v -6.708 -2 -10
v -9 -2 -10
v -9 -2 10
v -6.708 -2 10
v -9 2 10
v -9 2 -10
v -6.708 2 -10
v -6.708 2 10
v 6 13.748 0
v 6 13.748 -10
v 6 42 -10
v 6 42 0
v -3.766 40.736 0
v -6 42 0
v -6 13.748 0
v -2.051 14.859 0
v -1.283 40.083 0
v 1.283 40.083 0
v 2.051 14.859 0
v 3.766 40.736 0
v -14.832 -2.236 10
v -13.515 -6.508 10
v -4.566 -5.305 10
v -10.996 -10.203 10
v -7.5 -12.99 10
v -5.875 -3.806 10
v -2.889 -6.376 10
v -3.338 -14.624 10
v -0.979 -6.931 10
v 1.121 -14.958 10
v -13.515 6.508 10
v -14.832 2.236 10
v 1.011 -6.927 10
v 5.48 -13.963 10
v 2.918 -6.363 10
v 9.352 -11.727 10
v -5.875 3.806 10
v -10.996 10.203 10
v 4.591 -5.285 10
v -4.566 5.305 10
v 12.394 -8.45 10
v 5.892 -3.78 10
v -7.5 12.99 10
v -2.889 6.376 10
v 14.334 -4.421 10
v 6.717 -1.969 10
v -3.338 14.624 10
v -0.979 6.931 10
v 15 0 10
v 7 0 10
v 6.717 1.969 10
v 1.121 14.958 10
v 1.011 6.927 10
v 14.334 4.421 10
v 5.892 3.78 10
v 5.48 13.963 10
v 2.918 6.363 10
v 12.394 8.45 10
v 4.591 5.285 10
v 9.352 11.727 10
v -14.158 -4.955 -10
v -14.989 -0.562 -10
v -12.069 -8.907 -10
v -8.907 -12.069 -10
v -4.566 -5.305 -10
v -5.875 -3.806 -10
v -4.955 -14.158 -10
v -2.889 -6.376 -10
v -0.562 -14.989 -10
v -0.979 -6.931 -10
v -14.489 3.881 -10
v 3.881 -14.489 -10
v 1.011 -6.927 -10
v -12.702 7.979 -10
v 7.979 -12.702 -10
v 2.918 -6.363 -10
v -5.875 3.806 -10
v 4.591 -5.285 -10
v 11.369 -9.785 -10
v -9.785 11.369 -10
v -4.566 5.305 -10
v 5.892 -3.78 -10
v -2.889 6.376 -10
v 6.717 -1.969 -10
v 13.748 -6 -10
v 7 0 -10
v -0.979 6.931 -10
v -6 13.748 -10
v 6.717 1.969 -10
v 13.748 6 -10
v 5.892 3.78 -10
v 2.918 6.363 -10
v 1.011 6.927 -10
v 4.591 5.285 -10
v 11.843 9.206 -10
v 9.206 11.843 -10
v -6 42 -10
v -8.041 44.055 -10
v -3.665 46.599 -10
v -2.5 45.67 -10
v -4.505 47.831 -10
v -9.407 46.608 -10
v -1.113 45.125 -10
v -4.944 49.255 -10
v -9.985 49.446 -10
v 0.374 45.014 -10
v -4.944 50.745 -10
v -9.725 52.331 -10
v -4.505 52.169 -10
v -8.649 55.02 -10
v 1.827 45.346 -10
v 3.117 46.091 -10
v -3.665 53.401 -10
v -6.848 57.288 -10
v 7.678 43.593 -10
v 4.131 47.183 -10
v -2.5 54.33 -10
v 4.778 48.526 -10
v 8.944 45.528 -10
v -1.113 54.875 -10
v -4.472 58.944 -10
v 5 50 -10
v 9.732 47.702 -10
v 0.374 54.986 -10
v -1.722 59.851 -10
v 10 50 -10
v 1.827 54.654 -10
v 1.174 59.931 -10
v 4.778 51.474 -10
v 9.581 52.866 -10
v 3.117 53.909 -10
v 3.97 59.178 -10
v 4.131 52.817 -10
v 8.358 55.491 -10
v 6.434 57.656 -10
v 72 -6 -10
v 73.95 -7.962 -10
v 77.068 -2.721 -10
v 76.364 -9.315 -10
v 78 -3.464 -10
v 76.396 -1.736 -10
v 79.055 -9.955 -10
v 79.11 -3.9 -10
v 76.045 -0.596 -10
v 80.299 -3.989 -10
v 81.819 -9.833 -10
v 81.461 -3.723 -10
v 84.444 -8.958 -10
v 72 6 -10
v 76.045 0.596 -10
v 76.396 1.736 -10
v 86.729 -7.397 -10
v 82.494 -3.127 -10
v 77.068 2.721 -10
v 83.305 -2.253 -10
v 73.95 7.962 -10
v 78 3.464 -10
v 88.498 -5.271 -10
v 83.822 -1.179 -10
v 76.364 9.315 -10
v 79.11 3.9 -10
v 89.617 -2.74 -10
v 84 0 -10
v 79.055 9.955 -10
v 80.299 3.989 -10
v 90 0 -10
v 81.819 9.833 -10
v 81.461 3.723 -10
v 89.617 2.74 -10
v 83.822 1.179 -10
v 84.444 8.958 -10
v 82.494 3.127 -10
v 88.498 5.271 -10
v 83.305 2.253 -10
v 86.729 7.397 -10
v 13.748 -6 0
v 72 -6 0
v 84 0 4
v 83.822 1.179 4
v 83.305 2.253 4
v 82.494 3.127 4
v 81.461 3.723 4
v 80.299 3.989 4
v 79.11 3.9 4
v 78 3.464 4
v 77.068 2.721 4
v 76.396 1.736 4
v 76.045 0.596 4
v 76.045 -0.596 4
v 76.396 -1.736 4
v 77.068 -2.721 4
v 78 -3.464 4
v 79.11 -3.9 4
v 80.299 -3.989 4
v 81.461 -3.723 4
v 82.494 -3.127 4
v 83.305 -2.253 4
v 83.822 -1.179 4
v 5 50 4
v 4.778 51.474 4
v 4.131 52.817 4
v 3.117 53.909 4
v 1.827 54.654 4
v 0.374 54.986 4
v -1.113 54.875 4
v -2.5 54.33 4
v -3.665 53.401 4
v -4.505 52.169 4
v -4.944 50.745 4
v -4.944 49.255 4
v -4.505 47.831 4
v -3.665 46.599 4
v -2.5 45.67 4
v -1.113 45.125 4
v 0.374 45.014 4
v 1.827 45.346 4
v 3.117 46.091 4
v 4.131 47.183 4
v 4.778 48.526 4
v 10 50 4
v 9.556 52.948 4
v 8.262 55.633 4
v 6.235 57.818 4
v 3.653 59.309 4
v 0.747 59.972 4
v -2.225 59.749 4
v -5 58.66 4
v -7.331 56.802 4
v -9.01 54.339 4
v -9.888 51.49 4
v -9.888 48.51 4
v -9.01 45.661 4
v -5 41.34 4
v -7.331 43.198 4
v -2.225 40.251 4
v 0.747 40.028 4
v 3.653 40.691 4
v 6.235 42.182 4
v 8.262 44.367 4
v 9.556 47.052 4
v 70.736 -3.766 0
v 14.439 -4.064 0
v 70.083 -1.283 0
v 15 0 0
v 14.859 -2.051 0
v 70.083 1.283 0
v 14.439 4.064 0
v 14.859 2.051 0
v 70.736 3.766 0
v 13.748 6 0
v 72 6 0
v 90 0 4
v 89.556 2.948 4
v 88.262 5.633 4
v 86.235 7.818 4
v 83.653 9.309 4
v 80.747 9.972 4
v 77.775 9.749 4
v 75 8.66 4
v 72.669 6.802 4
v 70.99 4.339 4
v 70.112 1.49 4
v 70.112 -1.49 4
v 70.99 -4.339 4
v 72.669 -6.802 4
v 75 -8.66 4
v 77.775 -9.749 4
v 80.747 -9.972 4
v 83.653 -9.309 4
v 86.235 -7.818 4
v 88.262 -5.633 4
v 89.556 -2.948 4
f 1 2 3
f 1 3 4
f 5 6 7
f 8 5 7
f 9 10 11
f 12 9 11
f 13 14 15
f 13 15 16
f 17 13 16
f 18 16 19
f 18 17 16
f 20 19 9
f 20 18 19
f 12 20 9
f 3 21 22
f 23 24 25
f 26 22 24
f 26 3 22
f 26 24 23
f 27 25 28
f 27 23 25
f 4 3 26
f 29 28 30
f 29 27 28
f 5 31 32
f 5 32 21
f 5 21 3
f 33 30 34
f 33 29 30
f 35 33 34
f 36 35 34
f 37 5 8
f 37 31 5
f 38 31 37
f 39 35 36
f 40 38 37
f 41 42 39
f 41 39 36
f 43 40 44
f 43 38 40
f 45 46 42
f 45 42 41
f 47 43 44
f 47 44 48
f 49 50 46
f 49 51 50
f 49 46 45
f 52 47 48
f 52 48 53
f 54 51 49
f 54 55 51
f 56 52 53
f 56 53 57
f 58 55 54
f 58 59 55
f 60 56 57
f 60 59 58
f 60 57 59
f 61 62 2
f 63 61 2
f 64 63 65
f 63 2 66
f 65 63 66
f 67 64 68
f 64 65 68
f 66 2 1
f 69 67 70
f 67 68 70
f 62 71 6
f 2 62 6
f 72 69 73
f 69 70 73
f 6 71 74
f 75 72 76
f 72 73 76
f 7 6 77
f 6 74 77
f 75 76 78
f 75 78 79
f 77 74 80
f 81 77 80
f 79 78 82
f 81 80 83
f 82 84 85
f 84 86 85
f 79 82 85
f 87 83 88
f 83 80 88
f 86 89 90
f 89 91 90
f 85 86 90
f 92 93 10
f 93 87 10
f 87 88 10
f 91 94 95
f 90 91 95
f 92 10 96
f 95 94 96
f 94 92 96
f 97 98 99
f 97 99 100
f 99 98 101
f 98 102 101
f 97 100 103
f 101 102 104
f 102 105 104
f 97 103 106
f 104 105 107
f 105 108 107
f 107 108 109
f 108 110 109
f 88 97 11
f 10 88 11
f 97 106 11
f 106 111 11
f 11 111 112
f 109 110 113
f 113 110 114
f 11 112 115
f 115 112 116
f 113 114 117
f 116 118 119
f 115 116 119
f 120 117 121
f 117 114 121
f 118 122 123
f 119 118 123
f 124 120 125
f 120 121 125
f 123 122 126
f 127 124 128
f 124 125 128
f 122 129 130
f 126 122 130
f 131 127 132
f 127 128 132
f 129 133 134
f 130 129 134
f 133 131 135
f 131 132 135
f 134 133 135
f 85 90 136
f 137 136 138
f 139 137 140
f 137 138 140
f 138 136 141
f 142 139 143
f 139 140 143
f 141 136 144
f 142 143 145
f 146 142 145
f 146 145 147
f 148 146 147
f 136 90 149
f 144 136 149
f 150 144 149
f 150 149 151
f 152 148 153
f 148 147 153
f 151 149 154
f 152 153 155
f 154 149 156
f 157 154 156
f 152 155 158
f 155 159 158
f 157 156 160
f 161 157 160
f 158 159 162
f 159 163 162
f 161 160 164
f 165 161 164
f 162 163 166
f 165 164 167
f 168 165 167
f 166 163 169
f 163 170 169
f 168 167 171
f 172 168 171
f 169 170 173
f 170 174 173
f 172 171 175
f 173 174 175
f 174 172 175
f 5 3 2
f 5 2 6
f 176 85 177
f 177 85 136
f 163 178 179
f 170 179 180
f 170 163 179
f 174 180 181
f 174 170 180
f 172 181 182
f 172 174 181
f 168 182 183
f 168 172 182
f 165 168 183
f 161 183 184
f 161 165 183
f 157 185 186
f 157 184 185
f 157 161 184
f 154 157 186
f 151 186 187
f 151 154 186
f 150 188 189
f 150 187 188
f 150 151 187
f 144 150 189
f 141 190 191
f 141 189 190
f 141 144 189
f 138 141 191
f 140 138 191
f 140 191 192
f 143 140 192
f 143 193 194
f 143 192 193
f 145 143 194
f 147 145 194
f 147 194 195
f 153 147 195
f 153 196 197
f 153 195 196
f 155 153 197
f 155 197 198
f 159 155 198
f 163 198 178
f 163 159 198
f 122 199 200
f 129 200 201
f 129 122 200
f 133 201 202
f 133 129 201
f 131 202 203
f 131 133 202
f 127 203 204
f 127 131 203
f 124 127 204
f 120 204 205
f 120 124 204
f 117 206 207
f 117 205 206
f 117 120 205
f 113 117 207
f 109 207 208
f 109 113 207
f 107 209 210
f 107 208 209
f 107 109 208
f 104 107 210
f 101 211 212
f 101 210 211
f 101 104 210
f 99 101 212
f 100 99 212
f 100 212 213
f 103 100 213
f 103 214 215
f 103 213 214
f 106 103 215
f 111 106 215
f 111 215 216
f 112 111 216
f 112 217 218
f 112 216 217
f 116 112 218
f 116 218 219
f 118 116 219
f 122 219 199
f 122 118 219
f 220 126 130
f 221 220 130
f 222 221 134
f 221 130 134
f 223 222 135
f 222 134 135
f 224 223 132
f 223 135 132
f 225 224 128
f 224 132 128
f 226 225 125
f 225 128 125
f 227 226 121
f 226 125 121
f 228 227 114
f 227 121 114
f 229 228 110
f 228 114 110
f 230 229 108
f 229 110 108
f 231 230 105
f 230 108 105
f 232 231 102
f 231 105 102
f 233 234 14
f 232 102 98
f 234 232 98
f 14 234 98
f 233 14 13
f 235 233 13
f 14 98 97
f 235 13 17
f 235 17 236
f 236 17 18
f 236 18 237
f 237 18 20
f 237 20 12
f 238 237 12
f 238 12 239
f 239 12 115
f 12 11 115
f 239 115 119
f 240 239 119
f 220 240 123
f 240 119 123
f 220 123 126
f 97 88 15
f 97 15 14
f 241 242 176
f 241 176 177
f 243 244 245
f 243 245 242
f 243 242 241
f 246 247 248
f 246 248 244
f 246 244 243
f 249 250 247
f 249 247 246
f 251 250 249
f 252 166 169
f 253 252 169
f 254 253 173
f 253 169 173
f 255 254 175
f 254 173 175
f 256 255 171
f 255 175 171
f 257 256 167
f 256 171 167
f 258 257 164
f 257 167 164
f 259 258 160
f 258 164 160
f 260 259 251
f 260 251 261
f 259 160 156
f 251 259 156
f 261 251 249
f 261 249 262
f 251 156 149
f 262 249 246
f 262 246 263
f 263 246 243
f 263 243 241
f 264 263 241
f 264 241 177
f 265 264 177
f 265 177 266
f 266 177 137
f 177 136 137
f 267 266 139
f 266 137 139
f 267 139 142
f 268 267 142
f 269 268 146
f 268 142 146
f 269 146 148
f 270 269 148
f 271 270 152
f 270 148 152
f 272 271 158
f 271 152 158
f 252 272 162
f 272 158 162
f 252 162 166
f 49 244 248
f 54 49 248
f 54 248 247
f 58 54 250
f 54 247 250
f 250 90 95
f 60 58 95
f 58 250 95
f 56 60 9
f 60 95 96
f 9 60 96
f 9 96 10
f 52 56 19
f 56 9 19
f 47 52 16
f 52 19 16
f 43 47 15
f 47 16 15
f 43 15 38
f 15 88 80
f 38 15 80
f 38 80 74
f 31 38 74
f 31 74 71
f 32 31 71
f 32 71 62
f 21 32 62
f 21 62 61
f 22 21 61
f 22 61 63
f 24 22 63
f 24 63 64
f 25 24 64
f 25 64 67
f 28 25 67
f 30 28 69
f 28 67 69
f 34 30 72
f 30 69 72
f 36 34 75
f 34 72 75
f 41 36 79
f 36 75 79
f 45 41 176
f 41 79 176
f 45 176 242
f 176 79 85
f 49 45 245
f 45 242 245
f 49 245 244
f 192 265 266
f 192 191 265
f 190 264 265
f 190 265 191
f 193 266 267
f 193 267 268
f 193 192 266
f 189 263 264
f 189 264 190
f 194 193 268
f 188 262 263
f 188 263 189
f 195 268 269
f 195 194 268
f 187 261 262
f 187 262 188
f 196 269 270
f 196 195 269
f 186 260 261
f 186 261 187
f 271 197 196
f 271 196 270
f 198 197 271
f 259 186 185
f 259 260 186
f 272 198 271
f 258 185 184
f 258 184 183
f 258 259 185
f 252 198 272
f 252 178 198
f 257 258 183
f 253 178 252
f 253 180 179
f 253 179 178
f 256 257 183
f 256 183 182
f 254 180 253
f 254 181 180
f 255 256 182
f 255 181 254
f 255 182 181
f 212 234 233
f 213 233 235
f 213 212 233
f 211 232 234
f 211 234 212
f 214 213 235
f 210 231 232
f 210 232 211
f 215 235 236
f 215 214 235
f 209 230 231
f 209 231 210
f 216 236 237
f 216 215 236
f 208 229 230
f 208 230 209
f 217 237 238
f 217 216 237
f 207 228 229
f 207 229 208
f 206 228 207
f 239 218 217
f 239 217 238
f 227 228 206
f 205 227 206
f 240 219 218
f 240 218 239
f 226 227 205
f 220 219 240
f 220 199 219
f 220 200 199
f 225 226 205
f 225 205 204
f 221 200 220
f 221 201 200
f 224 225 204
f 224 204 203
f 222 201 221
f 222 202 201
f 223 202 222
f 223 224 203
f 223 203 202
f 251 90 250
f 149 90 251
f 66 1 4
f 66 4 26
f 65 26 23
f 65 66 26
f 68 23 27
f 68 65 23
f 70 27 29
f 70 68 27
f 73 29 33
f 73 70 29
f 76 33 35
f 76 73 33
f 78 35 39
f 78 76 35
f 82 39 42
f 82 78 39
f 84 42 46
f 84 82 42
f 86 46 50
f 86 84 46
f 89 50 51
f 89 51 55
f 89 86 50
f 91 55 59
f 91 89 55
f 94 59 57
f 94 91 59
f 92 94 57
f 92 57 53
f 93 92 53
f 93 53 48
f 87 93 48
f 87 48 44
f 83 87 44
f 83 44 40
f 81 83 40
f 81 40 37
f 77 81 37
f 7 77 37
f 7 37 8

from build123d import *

# Parameters (mm, degrees)
SKETCH_1_R          = 15
EXTRUDE_1_DEPTH     = 20
SKETCH_10_R         = 10
EXTRUDE_10_DEPTH    = 14
SKETCH_11_R         = 10
EXTRUDE_11_DEPTH    = 14
SKETCH_12_W         = 12
SKETCH_12_H         = 50
EXTRUDE_12_DEPTH    = 10
SKETCH_13_W         = 80
SKETCH_13_H         = 12
EXTRUDE_13_DEPTH    = 10
SKETCH_14_R         = 5
CUT_EXTRUDE_1_DEPTH = 111
SKETCH_15_R         = 4
CUT_EXTRUDE_2_DEPTH = 111
SKETCH_16_R         = 7
CUT_EXTRUDE_3_DEPTH = 111
SKETCH_17_W         = 3
SKETCH_17_H         = 4
CUT_EXTRUDE_4_DEPTH = 111


with BuildPart() as part:
    # 草图1 → 凸台-拉伸1 (new body)
    with BuildSketch(Plane.XY.offset(-10)):
        Circle(SKETCH_1_R)
    extrude(amount=EXTRUDE_1_DEPTH)



with BuildPart() as body_2:
    # 草图10 → 凸台-拉伸10 (new body)
    with BuildSketch(Plane.XY.offset(-10)):
        with Locations((0, 50)):
            Circle(SKETCH_10_R)
    extrude(amount=EXTRUDE_10_DEPTH)


with BuildPart() as body_3:
    # 草图11 → 凸台-拉伸11 (new body)
    with BuildSketch(Plane.XY.offset(-10)):
        with Locations((80, 0)):
            Circle(SKETCH_11_R)
    extrude(amount=EXTRUDE_11_DEPTH)


with BuildPart() as part_1:
    add(part.part)

    add(body_2.part)  # 凸台-拉伸12 merges body 2
    # 草图12 → 凸台-拉伸12 (add)
    with BuildSketch(Plane.XY.offset(-10)):
        with Locations((0, 25)):
            Rectangle(SKETCH_12_W, SKETCH_12_H)
    extrude(amount=EXTRUDE_12_DEPTH)


    add(body_3.part)  # 凸台-拉伸13 merges body 3
    # 草图13 → 凸台-拉伸13 (add)
    with BuildSketch(Plane.XY.offset(-10)):
        with Locations((40, 0)):
            Rectangle(SKETCH_13_W, SKETCH_13_H)
    extrude(amount=EXTRUDE_13_DEPTH)

    # 草图14 → 切除-拉伸1 (cut, through all)
    with BuildSketch(Plane.XY.offset(-10)):
        with Locations((0, 50)):
            Circle(SKETCH_14_R)
    extrude(amount=CUT_EXTRUDE_1_DEPTH, mode=Mode.SUBTRACT)

    # 草图15 → 切除-拉伸2 (cut, through all)
    with BuildSketch(Plane.XY.offset(-10)):
        with Locations((80, 0)):
            Circle(SKETCH_15_R)
    extrude(amount=CUT_EXTRUDE_2_DEPTH, mode=Mode.SUBTRACT)

    # 草图16 → 切除-拉伸3 (cut, through all)
    with BuildSketch(Plane.XY.offset(-10)):
        Circle(SKETCH_16_R)
    extrude(amount=CUT_EXTRUDE_3_DEPTH, mode=Mode.SUBTRACT)

    # 草图17 → 切除-拉伸4 (cut, through all)
    with BuildSketch(Plane.XY.offset(-10)):
        with Locations((-7.5, 0)):
            Rectangle(SKETCH_17_W, SKETCH_17_H)
    extrude(amount=CUT_EXTRUDE_4_DEPTH, mode=Mode.SUBTRACT)


solid = part_1.part
